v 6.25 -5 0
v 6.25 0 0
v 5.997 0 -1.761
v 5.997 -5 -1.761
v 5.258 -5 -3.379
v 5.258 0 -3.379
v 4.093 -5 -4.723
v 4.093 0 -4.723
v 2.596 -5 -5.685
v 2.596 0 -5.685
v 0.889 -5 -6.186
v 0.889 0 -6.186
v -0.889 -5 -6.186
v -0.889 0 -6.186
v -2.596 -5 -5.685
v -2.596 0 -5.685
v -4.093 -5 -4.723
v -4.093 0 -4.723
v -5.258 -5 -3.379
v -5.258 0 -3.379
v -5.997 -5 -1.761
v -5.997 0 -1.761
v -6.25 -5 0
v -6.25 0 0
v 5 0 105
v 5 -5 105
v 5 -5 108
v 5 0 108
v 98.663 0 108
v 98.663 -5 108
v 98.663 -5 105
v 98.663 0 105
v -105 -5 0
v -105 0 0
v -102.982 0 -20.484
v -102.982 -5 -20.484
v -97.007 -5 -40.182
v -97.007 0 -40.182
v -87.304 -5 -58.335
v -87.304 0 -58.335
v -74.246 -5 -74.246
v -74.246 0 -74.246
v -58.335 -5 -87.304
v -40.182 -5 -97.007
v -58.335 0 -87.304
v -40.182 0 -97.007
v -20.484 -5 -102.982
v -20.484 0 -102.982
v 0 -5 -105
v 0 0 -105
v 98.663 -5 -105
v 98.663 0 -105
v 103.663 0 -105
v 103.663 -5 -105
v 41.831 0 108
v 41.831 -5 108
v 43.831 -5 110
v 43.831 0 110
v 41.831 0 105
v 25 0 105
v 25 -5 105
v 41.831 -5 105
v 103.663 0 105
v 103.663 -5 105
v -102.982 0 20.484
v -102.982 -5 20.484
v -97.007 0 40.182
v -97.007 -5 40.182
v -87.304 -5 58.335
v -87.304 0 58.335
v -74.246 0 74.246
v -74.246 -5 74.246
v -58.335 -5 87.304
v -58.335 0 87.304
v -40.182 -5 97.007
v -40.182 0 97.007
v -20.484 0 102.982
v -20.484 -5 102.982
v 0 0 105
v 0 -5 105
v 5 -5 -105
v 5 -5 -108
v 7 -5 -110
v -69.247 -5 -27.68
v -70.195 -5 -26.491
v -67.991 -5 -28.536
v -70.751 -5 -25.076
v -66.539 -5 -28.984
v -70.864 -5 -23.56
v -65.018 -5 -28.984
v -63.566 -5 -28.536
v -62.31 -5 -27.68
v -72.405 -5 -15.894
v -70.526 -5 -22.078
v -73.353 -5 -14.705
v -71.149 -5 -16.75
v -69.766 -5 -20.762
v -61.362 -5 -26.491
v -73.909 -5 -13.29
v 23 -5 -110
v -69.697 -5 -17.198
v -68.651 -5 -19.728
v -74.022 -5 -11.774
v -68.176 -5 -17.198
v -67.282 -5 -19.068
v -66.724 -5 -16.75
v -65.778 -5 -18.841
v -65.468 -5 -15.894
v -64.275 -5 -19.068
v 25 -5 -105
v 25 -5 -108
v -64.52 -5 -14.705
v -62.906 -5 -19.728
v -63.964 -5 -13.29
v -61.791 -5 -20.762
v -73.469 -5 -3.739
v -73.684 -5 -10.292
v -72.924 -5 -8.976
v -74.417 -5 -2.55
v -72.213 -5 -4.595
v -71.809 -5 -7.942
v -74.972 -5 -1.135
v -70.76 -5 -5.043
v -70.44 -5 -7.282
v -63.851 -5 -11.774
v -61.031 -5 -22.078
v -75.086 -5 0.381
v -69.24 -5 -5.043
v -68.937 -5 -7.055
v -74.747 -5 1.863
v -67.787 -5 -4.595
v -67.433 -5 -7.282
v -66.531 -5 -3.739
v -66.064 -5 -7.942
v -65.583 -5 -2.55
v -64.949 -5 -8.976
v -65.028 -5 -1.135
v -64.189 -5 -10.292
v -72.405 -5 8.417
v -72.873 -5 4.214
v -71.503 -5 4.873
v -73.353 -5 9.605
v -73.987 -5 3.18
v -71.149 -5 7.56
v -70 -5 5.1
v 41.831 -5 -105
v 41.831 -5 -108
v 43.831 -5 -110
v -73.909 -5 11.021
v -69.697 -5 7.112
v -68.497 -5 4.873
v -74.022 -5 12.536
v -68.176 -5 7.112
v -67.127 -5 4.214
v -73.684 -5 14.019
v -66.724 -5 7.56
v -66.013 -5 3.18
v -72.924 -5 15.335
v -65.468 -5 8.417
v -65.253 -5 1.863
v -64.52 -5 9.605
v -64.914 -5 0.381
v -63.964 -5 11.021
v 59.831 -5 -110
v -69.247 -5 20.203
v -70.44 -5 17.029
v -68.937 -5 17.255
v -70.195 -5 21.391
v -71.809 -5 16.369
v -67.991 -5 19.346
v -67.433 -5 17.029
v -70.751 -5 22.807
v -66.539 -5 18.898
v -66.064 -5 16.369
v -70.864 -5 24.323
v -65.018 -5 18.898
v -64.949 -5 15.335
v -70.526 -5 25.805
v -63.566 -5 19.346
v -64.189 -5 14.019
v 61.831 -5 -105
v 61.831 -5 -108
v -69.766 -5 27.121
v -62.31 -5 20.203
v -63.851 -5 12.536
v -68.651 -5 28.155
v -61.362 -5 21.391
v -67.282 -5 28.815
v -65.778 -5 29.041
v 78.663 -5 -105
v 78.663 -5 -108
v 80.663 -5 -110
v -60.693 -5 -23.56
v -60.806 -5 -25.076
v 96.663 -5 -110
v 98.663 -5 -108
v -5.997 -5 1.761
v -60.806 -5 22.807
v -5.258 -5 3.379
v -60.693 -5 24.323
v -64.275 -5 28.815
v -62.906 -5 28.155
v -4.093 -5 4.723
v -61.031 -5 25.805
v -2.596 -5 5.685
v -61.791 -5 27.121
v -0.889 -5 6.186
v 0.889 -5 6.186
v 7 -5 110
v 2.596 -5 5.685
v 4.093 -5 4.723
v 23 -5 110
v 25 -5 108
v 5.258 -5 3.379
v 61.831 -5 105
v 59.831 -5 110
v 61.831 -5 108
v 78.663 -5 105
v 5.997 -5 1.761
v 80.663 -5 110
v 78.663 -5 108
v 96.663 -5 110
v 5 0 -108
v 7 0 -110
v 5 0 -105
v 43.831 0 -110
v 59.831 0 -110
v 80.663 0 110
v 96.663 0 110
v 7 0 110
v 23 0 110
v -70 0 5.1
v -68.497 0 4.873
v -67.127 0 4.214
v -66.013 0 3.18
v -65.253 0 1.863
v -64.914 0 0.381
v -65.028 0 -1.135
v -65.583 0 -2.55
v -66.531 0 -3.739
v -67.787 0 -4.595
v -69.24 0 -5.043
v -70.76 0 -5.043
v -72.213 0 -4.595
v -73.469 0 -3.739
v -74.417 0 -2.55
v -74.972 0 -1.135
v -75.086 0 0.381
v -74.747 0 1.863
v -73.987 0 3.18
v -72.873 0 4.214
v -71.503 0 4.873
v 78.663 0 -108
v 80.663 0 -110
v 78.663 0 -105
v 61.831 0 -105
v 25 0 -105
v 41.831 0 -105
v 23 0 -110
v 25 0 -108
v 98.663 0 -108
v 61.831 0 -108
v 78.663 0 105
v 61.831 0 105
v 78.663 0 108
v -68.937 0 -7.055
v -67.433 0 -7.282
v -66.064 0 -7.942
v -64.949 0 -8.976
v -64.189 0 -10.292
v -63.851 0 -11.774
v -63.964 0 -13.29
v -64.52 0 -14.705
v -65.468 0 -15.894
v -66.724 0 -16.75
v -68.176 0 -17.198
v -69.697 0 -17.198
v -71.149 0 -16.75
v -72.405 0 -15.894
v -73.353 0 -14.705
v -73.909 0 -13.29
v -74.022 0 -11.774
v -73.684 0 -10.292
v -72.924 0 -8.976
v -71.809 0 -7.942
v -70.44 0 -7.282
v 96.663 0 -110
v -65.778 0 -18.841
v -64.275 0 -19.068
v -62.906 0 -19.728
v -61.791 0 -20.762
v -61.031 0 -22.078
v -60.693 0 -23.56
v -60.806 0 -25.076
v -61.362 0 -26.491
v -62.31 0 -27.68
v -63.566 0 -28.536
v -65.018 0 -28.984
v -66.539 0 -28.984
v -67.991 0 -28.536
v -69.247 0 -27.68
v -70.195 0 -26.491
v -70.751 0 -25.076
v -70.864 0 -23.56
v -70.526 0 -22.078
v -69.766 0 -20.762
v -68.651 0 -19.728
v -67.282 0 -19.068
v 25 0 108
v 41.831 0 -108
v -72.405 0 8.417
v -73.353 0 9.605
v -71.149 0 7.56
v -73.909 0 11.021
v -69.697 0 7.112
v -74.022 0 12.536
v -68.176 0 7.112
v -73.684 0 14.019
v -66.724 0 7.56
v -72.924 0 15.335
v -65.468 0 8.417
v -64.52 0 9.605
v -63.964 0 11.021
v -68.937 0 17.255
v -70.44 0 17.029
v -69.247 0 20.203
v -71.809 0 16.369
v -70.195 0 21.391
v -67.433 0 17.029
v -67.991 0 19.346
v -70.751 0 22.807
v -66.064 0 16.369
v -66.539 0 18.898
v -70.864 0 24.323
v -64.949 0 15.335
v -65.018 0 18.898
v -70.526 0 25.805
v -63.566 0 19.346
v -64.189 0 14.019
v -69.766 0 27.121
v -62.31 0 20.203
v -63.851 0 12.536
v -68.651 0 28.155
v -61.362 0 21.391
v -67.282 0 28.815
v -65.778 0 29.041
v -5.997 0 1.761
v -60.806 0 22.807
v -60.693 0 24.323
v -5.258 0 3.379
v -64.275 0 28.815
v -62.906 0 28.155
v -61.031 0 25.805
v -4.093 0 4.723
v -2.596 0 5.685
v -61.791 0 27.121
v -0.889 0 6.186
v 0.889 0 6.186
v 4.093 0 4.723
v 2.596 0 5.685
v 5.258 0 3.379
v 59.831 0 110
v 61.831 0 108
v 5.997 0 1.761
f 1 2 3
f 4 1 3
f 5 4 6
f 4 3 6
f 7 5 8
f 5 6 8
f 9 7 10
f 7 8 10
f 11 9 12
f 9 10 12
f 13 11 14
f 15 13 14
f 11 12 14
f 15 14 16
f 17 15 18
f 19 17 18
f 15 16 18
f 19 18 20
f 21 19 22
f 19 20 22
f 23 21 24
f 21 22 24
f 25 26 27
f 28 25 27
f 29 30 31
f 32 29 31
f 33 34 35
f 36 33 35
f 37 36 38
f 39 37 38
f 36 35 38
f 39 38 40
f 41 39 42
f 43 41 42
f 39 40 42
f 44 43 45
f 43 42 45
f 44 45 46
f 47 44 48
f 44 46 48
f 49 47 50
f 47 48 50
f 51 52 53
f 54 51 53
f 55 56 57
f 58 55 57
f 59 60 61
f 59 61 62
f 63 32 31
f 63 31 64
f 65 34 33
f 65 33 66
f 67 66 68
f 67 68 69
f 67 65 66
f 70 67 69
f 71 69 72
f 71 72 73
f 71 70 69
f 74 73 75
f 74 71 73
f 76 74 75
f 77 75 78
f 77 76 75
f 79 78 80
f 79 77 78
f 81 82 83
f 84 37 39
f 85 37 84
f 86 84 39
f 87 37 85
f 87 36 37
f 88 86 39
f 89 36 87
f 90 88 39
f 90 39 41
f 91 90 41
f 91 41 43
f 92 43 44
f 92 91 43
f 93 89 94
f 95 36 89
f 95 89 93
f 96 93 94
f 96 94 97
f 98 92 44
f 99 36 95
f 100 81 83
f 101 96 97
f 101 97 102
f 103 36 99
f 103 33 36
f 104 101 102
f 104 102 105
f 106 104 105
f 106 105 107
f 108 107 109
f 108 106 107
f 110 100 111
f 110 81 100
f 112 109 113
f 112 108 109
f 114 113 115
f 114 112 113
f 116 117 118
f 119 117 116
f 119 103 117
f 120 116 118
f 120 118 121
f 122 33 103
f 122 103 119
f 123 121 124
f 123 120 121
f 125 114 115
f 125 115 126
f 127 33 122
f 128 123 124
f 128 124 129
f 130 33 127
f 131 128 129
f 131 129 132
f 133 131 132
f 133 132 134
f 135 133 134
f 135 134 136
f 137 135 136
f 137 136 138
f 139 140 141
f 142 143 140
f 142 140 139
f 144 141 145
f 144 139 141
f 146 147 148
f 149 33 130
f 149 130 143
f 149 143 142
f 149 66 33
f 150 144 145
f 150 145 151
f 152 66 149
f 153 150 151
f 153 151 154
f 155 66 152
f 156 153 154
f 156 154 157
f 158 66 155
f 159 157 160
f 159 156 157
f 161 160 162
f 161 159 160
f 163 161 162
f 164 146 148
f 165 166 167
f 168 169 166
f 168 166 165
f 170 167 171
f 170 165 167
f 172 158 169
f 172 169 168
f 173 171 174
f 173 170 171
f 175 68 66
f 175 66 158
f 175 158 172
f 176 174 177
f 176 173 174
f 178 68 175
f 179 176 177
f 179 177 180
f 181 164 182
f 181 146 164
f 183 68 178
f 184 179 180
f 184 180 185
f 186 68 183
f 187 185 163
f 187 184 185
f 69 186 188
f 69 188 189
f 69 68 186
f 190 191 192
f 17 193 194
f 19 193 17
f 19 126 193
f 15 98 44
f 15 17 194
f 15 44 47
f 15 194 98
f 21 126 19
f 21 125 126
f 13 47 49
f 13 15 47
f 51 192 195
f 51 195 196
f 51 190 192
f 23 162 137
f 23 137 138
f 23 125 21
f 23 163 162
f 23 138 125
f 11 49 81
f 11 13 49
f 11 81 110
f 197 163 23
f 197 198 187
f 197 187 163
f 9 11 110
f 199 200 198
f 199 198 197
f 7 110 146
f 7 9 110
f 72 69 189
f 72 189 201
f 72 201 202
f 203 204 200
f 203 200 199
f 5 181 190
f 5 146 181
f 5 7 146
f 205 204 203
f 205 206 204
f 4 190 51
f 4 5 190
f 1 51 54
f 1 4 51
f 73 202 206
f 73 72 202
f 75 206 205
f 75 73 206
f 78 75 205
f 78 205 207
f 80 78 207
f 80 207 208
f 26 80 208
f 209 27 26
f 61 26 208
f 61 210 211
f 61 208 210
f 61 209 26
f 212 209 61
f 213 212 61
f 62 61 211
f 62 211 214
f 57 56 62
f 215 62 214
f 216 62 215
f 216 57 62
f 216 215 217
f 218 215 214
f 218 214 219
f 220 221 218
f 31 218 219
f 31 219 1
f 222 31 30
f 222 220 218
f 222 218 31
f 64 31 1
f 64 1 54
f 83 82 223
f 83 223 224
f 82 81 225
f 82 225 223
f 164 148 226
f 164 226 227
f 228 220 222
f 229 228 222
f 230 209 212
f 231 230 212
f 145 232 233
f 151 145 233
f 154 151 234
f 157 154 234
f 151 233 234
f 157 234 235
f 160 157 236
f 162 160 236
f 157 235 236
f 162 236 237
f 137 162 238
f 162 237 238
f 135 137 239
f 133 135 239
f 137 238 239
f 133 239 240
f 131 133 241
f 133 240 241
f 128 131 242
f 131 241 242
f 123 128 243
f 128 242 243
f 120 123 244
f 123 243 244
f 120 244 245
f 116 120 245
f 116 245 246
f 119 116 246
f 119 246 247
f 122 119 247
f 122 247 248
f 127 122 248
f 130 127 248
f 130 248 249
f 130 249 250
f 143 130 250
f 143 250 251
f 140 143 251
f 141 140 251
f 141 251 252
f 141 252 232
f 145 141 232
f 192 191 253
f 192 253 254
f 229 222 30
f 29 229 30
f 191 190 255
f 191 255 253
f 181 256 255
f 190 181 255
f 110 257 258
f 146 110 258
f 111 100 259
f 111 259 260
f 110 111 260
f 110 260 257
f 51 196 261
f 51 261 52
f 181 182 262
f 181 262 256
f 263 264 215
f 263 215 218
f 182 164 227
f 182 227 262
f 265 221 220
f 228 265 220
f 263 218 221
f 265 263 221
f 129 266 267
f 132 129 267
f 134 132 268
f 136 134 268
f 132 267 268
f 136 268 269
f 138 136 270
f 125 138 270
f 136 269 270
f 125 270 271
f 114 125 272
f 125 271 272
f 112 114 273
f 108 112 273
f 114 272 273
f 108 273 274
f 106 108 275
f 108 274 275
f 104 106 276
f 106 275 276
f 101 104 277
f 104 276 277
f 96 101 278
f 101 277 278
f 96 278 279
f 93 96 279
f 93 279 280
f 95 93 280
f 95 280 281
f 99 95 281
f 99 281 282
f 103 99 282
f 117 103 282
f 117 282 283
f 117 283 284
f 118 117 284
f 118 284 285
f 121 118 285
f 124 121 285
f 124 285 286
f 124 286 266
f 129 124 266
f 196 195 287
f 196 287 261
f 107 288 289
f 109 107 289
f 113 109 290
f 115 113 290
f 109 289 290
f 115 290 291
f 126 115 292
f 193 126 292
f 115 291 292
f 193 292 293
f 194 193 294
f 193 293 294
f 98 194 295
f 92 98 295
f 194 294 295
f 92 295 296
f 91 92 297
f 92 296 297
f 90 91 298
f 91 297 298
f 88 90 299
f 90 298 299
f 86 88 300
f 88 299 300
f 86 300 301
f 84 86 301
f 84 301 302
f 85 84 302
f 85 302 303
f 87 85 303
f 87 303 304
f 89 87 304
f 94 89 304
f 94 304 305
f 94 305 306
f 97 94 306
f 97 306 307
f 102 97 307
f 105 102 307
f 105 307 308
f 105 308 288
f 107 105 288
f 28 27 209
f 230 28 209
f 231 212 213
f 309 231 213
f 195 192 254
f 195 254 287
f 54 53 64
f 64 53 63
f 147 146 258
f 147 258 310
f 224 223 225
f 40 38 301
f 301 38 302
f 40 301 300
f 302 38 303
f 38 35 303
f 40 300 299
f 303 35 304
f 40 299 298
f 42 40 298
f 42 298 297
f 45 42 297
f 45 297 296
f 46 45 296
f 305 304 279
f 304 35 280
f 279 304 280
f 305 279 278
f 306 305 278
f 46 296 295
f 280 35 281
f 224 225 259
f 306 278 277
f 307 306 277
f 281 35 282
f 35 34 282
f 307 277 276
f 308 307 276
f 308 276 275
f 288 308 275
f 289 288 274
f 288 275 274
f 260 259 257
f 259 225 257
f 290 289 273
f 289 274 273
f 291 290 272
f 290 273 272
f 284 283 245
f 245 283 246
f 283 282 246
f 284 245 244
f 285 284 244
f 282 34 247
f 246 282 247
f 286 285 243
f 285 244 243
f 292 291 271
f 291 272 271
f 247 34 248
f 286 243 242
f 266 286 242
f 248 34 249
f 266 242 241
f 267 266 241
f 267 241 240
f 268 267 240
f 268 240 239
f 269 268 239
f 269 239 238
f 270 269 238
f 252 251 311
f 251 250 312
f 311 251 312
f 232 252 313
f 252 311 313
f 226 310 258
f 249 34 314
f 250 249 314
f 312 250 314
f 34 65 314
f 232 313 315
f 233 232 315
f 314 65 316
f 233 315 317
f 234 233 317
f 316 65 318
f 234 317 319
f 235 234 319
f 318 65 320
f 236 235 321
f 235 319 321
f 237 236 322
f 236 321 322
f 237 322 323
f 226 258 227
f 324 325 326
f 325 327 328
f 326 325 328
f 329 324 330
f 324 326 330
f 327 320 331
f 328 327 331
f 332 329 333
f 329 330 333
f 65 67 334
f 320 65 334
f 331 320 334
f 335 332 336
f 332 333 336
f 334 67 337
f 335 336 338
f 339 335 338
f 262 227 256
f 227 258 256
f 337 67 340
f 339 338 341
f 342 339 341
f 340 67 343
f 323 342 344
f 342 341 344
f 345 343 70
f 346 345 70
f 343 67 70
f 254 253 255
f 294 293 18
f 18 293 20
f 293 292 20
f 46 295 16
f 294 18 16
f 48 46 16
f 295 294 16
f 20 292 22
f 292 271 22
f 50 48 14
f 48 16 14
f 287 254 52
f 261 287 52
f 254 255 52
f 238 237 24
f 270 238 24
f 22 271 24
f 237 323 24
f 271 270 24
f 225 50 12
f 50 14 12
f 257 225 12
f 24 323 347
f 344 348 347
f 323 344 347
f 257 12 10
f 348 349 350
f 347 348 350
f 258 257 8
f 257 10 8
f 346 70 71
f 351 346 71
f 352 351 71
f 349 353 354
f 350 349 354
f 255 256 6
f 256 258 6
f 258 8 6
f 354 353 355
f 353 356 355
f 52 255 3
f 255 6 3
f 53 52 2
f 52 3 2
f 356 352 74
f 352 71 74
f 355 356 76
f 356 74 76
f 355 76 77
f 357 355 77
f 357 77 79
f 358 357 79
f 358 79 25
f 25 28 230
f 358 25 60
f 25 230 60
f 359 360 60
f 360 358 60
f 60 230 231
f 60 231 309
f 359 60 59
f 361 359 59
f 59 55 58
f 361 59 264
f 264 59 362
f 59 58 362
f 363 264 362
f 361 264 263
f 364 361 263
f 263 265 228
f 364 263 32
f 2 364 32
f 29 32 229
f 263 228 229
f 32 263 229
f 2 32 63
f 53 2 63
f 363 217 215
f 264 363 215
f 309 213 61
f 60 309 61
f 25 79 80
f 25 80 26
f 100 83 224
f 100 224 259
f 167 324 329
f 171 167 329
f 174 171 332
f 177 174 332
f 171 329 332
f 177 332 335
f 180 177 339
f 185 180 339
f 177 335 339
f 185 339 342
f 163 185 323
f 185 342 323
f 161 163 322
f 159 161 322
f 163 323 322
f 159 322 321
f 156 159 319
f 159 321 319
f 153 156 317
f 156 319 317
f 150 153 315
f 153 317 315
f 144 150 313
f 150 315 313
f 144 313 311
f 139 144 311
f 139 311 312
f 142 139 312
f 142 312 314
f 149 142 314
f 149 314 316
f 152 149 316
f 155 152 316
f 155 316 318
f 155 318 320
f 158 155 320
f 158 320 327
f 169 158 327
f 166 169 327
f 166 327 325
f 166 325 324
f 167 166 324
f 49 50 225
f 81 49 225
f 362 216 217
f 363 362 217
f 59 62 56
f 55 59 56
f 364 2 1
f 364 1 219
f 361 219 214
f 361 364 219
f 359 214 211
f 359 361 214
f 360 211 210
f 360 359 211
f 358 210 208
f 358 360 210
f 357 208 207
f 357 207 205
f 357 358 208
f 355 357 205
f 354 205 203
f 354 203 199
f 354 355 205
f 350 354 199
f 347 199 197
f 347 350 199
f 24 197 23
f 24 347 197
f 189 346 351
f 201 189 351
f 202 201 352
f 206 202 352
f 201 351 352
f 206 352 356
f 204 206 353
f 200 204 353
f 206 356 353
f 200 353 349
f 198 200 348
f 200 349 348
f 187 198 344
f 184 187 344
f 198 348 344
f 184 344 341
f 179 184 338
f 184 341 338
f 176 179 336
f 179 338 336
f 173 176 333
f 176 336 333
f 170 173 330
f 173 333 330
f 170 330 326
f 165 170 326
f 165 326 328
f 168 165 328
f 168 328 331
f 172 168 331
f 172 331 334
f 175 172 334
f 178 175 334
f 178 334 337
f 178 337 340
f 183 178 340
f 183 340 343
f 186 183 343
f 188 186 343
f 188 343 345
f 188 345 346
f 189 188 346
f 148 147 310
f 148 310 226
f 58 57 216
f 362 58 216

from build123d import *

# Parameters (mm, degrees)
SM_BASE_FLANGE_1_DEPTH = 5
OTHER_START            = -5
OTHER_1_DEPTH          = 5
SKETCH_8_R             = 5.1
CUT_EXTRUDE_1_DEPTH    = 153.151240547


# Read off the part's stored shape, not the designer's step: Выступы и прорези-Выступ1
# Sheet-metal steps are written as plain solids
with BuildPart() as part:
    # Sketch 1 → Базовая кромка1 (new body)
    with BuildSketch(Plane(origin=(0, 0, 0), x_dir=(1, 0, 0), z_dir=(0, 1, 0))):
        with BuildLine():
            Line((0, -105), (103.662809462, -105))
            Line((103.662809462, -105), (103.662809462, 0))
            Line((103.662809462, 0), (6.25, 0))
            ThreePointArc((6.25, 0), (0, -6.25), (-6.25, 0))
            Line((-6.25, 0), (-105, 0))
            ThreePointArc((-105, 0), (-74.246212025, -74.246212025), (0, -105))
        make_face()
    extrude(amount=-SM_BASE_FLANGE_1_DEPTH)

    # Other 1 outline → Other 1 (add)
    with BuildSketch(Plane(origin=(0, 0, 0), x_dir=(1, 0, 0), z_dir=(0, 1, 0)).offset(OTHER_START)):
        Polygon((98.662809462, -105), (78.662809462, -105), (78.662809462, -108), (80.662809462, -110), (96.662809462, -110), (98.662809462, -108), align=None)
        Polygon((61.831404731, -105), (41.831404731, -105), (41.831404731, -108), (43.831404731, -110), (59.831404731, -110), (61.831404731, -108), align=None)
        Polygon((5, -105), (5, -108), (7, -110), (23, -110), (25, -108), (25, -105), align=None)
    extrude(amount=OTHER_1_DEPTH)

    # Зеркальное отражение1: part across plane


with BuildPart() as part_1:
    add(part.part)
    add(part.part.mirror(Plane(origin=(6.25, -5, 0), x_dir=(1, 0, 0), z_dir=(0, 0, -1))))

    # Эскиз8 → Вырез-Вытянуть1 (cut, through all)
    with BuildSketch(Plane(origin=(0, 0, 0), x_dir=(1, 0, 0), z_dir=(0, 1, 0))):
        with Locations(Location((-65.778483455, 23.941410033, 0), (0, 0, 270))):
            Circle(SKETCH_8_R)
        with Locations(Location((-68.936542711, 12.155372437, 0), (0, 0, 270))):
            Circle(SKETCH_8_R)
        with Locations(Location((-70, 0, 0), (0, 0, 270))):
            Circle(SKETCH_8_R)
        with Locations(Location((-68.936542711, -12.155372437, 0), (0, 0, 270))):
            Circle(SKETCH_8_R)
        with Locations(Location((-65.778483455, -23.941410033, 0), (0, 0, 270))):
            Circle(SKETCH_8_R)
    extrude(amount=-CUT_EXTRUDE_1_DEPTH, mode=Mode.SUBTRACT)


solid = part_1.part
